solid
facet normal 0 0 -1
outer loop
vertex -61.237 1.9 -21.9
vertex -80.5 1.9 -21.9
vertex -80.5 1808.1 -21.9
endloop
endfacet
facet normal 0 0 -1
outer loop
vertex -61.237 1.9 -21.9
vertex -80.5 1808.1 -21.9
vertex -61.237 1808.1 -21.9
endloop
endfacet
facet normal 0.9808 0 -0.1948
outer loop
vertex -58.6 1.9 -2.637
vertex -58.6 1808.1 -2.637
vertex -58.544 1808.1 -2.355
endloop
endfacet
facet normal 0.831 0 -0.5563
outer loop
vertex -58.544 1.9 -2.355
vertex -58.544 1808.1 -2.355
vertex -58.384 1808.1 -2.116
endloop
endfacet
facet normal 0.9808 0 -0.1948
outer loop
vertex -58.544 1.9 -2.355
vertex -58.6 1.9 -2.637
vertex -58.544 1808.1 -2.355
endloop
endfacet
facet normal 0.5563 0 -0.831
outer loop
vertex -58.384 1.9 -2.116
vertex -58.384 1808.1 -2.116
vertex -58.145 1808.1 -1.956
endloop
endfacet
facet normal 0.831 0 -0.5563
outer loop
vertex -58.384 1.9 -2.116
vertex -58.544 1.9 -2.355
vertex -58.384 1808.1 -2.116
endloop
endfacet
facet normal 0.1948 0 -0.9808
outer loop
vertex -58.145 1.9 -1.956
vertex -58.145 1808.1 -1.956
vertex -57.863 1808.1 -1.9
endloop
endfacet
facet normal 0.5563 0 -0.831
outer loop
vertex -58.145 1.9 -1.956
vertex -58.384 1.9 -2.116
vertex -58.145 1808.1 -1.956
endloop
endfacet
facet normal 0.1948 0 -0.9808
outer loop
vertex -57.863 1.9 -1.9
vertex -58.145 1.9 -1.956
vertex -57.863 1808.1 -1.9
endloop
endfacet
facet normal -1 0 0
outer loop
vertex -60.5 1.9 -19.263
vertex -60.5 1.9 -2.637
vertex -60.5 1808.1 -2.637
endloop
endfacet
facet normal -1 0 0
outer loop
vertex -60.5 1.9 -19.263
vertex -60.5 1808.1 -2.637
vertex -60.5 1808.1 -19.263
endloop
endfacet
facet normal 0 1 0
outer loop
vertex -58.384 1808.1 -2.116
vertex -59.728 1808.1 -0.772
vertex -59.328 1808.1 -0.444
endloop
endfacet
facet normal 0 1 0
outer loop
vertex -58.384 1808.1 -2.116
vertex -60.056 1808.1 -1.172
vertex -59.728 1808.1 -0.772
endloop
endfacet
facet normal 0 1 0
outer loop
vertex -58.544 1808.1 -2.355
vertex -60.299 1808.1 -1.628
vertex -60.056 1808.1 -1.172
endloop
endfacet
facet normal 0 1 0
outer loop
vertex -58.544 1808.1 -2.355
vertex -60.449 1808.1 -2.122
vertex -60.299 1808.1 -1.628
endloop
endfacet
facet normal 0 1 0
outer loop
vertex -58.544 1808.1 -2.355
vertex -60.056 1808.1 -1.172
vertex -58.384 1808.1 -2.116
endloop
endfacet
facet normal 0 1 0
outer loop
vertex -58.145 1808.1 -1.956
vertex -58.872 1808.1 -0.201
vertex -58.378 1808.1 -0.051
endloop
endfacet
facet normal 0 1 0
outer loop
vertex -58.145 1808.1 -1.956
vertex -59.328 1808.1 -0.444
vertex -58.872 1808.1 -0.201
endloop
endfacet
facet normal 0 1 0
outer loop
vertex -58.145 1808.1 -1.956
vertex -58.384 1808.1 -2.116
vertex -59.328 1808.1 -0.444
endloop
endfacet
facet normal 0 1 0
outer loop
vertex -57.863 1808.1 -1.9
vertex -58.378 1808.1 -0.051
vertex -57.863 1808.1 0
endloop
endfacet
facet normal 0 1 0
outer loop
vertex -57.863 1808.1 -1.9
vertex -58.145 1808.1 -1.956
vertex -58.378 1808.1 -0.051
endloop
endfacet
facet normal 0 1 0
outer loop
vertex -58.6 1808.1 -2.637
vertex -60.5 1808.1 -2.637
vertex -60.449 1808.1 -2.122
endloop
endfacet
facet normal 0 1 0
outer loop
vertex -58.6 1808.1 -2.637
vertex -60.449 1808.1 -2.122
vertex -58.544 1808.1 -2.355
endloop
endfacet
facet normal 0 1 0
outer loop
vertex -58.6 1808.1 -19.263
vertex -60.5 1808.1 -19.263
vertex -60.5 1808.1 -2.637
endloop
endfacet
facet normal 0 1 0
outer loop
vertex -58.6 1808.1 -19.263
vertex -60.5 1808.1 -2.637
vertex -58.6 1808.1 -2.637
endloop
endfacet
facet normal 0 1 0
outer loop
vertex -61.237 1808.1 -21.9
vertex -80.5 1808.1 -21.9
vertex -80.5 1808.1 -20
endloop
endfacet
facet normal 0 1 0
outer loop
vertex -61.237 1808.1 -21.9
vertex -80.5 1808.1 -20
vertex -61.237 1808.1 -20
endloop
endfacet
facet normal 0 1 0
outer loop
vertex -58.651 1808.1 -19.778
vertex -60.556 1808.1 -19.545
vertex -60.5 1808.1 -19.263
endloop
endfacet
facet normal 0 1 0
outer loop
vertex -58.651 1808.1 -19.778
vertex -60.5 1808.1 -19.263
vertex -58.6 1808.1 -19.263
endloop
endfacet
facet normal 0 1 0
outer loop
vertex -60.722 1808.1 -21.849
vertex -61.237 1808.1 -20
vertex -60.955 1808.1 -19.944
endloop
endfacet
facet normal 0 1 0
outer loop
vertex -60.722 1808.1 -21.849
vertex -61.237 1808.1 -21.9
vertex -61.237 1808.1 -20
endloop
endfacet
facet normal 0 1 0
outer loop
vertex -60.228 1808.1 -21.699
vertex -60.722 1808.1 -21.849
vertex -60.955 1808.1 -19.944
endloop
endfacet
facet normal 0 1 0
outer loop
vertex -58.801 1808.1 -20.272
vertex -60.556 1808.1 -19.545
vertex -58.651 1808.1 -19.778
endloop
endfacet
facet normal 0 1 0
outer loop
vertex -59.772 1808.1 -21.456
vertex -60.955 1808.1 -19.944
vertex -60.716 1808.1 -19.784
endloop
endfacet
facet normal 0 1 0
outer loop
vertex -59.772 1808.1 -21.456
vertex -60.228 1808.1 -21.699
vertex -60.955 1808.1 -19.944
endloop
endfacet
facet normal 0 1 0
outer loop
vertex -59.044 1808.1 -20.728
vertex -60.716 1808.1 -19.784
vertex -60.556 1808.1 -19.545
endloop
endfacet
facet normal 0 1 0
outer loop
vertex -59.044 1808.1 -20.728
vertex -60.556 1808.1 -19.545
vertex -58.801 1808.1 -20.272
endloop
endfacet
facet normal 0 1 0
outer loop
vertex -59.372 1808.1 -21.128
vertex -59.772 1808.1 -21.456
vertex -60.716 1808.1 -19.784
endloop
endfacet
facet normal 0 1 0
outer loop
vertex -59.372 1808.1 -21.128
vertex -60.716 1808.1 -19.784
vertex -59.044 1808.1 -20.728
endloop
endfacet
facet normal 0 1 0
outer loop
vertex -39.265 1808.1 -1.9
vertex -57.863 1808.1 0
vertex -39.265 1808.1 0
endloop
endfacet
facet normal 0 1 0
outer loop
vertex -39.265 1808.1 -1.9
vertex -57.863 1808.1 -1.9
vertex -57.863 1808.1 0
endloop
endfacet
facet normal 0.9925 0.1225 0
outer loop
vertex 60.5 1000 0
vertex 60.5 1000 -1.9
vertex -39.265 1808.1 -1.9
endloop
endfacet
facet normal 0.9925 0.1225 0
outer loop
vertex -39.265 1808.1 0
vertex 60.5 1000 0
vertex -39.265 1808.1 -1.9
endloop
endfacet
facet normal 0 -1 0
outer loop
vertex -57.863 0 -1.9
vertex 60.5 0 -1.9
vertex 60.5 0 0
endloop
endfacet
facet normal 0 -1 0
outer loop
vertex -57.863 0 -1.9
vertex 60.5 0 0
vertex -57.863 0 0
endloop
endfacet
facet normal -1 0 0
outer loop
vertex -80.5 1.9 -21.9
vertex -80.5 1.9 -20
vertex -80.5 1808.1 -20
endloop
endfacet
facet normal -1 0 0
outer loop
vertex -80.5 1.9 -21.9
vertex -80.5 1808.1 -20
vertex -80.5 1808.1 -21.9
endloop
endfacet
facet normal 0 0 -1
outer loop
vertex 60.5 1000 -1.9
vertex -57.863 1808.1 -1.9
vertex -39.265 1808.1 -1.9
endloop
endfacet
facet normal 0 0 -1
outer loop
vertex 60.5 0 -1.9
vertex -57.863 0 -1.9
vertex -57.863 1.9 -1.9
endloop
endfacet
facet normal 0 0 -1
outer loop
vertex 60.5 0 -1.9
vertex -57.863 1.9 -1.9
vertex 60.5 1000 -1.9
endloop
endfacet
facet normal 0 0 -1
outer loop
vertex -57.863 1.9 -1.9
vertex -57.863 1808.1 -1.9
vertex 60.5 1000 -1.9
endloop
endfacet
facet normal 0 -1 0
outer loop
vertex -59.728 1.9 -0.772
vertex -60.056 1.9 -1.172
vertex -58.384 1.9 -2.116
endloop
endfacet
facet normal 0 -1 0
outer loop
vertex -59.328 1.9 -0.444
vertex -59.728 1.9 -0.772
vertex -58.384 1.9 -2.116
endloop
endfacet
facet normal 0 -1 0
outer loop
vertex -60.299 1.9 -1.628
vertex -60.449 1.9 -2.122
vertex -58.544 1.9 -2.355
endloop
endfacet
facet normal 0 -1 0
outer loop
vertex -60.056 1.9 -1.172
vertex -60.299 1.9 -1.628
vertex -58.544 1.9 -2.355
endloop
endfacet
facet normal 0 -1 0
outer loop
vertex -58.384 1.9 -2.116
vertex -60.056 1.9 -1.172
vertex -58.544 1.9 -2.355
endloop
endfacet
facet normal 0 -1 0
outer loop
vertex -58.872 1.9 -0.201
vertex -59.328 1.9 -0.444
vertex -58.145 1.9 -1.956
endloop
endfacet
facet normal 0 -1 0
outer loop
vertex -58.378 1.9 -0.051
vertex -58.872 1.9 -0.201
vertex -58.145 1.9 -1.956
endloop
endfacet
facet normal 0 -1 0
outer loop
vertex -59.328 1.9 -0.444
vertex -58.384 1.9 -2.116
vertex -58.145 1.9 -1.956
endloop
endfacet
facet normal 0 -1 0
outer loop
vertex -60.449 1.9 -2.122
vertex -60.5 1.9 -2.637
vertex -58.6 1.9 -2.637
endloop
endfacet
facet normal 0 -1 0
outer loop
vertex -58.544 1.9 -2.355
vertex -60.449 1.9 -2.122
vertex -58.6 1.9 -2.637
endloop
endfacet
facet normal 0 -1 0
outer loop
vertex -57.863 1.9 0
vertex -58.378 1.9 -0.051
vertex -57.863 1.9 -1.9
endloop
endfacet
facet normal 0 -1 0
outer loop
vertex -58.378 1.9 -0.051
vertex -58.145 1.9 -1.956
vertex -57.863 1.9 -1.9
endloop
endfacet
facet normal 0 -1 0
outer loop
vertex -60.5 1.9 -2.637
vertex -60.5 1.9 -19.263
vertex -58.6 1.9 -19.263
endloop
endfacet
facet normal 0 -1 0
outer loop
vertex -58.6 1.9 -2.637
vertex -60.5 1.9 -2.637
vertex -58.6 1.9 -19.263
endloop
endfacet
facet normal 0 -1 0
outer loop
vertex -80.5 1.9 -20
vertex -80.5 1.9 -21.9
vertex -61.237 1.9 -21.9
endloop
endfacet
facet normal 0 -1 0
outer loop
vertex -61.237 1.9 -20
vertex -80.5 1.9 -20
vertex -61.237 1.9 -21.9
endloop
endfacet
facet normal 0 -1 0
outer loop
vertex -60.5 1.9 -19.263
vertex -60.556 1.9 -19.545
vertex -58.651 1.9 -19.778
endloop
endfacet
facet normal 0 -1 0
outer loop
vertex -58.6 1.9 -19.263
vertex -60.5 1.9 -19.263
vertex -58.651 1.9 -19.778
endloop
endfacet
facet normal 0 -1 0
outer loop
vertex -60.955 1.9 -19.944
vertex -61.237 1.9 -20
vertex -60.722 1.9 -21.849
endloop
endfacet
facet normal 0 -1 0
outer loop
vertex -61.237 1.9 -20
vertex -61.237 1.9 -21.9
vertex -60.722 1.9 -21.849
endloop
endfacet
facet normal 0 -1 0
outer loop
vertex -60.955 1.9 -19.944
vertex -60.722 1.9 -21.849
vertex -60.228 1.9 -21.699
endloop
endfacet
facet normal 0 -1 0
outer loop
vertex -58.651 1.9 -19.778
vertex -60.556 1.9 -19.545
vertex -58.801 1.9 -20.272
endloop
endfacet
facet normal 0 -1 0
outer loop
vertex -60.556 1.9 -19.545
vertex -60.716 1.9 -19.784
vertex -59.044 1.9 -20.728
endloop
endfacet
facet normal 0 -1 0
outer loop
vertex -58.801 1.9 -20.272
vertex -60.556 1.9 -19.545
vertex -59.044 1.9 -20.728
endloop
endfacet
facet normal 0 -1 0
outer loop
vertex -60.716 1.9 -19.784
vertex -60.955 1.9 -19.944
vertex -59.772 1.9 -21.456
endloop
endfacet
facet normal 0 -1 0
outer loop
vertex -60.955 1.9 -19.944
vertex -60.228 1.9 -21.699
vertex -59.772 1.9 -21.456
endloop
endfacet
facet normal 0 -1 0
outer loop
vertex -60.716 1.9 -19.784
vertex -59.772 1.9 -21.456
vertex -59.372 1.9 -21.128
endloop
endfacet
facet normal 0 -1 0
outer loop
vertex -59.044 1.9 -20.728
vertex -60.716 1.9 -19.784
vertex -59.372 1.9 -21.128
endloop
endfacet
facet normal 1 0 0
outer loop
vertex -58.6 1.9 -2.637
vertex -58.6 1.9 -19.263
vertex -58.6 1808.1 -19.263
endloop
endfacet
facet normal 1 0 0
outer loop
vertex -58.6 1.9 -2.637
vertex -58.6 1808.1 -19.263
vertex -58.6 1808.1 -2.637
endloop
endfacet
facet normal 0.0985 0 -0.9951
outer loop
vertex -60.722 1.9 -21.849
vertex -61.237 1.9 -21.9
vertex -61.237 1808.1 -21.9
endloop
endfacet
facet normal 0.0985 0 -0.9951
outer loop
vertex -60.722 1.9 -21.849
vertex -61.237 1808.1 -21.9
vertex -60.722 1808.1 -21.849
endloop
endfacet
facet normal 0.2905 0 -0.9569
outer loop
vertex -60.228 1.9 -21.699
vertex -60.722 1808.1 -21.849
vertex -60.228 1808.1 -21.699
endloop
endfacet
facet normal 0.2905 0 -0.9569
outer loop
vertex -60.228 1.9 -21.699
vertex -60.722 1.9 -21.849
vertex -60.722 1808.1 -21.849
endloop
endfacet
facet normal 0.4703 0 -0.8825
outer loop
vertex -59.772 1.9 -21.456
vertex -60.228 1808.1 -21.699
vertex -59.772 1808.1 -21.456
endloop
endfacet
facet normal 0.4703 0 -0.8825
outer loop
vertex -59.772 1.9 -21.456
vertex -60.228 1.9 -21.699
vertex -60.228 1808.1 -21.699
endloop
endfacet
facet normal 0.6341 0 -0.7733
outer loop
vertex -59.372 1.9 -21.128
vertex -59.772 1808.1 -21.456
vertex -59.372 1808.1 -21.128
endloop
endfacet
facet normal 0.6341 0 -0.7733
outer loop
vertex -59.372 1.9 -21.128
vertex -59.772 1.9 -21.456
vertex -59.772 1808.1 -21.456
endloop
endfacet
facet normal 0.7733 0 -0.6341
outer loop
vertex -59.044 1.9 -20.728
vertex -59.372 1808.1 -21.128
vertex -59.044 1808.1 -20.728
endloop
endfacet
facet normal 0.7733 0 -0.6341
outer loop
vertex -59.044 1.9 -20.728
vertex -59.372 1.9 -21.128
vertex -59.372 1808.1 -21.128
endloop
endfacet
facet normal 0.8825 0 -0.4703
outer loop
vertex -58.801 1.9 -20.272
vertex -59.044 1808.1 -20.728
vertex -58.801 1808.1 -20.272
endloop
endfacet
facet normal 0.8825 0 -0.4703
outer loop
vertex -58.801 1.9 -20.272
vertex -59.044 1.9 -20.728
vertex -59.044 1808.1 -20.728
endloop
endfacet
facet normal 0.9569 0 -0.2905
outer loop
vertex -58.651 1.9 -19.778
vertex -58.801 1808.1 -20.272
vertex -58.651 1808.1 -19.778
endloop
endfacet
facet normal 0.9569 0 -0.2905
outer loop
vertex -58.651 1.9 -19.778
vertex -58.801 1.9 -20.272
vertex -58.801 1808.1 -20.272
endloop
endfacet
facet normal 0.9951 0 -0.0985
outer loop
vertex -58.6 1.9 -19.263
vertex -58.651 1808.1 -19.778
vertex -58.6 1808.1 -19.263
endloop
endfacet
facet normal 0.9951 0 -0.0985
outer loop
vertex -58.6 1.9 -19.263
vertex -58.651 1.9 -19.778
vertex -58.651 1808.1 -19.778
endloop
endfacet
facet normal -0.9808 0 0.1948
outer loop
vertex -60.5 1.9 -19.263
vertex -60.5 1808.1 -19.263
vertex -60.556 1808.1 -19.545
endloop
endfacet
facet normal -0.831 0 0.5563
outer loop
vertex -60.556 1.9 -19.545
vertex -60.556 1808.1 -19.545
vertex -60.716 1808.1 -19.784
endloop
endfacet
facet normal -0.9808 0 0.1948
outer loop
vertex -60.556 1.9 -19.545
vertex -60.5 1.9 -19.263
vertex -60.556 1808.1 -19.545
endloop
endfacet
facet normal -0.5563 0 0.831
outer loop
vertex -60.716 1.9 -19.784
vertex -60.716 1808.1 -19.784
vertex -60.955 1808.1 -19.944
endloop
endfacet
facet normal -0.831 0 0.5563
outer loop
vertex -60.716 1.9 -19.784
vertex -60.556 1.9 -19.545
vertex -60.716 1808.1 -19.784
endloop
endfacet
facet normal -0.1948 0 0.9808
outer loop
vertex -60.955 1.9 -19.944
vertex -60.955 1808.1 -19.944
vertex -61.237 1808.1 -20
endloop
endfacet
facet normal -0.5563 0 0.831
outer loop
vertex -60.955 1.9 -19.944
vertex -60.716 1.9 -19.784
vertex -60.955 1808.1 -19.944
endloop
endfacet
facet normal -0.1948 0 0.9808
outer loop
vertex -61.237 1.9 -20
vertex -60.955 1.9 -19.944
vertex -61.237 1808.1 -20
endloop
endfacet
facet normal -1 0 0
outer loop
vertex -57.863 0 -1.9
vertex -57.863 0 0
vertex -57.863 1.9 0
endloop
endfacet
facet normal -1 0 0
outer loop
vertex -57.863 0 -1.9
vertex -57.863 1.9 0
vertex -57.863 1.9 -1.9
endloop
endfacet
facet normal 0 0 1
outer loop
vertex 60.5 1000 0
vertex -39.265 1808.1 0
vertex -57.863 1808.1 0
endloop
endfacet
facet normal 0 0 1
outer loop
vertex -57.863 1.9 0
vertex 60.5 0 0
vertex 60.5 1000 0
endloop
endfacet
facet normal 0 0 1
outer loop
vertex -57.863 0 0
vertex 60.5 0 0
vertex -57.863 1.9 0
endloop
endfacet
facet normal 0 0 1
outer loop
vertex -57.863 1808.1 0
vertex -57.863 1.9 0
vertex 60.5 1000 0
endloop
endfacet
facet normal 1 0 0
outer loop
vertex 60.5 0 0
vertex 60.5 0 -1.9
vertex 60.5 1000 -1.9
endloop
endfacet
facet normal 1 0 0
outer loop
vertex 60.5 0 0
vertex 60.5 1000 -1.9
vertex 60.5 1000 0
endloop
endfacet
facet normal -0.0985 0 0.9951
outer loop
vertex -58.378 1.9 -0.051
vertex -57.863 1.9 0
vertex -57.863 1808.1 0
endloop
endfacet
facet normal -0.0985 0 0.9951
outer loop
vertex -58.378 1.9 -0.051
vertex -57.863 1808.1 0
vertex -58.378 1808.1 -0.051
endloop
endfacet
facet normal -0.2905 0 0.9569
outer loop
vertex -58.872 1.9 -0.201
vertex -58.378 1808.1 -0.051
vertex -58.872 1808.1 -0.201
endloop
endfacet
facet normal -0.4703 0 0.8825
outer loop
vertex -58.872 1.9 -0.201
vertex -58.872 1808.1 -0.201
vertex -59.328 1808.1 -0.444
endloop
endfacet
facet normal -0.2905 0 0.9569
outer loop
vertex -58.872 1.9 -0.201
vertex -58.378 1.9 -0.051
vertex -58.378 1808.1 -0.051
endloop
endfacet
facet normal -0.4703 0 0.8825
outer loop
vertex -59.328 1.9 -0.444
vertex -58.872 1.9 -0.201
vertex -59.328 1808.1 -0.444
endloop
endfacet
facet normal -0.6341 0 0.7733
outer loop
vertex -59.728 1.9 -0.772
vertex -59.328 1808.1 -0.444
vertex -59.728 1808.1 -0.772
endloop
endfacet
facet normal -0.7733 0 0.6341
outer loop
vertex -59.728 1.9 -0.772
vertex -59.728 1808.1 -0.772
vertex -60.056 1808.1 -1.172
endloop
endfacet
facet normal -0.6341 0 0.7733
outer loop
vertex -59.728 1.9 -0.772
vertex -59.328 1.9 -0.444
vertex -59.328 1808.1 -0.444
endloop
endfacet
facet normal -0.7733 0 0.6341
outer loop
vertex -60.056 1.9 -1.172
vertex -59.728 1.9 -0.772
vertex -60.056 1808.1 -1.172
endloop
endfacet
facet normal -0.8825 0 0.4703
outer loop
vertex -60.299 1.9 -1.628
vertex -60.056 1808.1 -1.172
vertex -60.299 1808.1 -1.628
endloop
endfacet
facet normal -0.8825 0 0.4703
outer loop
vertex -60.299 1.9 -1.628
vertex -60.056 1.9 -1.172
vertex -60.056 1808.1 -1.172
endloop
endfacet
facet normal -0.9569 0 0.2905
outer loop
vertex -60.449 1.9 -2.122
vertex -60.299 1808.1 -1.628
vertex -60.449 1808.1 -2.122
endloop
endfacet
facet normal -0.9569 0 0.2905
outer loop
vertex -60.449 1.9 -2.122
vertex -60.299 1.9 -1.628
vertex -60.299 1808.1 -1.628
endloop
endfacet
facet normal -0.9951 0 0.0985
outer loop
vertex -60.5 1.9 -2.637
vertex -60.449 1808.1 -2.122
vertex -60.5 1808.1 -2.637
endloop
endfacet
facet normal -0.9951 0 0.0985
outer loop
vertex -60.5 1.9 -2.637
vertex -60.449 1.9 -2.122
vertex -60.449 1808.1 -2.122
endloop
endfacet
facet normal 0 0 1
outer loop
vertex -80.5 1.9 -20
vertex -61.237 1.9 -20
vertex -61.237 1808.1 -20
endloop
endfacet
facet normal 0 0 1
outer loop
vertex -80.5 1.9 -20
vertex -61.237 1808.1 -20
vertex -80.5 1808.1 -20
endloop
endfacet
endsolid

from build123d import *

# Parameters (mm, degrees)
BRIDA_BASE4_DEPTH          = 1810
CORTAR_EXTRUIR1_DEPTH      = 1812.921593226
CORTAR_EXTRUIR1_DEPTH_BACK = 1812.921593226
CORTAR_EXTRUIR2_DEPTH      = 1.9
CORTAR_EXTRUIR3_DEPTH      = 1812.899624703
CORTAR_EXTRUIR3_DEPTH_BACK = 1812.899624703
CROQUIS22_W                = 55.247943396
CROQUIS22_H                = 1.9


# Read off the part's stored shape, not the designer's step: Cortar-Extruir2
# Sheet-metal steps are written as plain solids
with BuildPart() as part:
    # Croquis1 → Brida base4 (new body)
    with BuildSketch(Plane(origin=(0, 0, 0), x_dir=(1, 0, 0), z_dir=(0, 1, 0))):
        with BuildLine():
            Line((60.5, 0), (-57.8634, 0))
            ThreePointArc((-57.8634, 0), (-59.727757739, 0.772242261), (-60.5, 2.6366))
            Line((-60.5, 2.6366), (-60.5, 19.2634))
            ThreePointArc((-60.5, 19.2634), (-60.715745145, 19.784254855), (-61.2366, 20))
            Line((-61.2366, 20), (-80.5, 20))
            Line((-80.5, 20), (-80.5, 21.9))
            Line((-80.5, 21.9), (-61.2366, 21.9))
            ThreePointArc((-61.2366, 21.9), (-59.372242261, 21.127757739), (-58.6, 19.2634))
            Line((-58.6, 19.2634), (-58.6, 2.6366))
            ThreePointArc((-58.6, 2.6366), (-58.384254855, 2.115745145), (-57.8634, 1.9))
            Line((-57.8634, 1.9), (60.5, 1.9))
            Line((60.5, 1.9), (60.5, 0))
        make_face()
    extrude(amount=BRIDA_BASE4_DEPTH)

    # Croquis19 → Cortar-Extruir1 (cut, two sides: drawn at the far end of the back side and taken through both)
    with BuildSketch(Plane.XY.offset(-CORTAR_EXTRUIR1_DEPTH_BACK)):
        Polygon((60.5, 1000), (-39.5, 1810), (-39.5, 1900.089959651), (60.5, 1900.089959651), align=None)
    extrude(amount=CORTAR_EXTRUIR1_DEPTH + CORTAR_EXTRUIR1_DEPTH_BACK, mode=Mode.SUBTRACT)

    # Cortar-Extruir2 outline → Cortar-Extruir2 (cut)
    with BuildSketch(Plane(origin=(0, 0, 0), x_dir=(1, 0, 0), z_dir=(0, 1, 0))):
        with BuildLine():
            Line((-57.8634, 0), (-57.8634, 1.9))
            ThreePointArc((-57.8634, 1.9), (-58.384254855, 2.115745145), (-58.6, 2.6366))
            Line((-58.6, 2.6366), (-58.6, 19.2634))
            ThreePointArc((-58.6, 19.2634), (-59.372242261, 21.127757739), (-61.2366, 21.9))
            Line((-61.2366, 21.9), (-80.5, 21.9))
            Line((-80.5, 21.9), (-80.5, 20))
            Line((-80.5, 20), (-61.2366, 20))
            ThreePointArc((-61.2366, 20), (-60.715745145, 19.784254855), (-60.5, 19.2634))
            Line((-60.5, 19.2634), (-60.5, 2.6366))
            ThreePointArc((-60.5, 2.6366), (-59.727757739, 0.772242261), (-57.8634, 0))
        make_face()
    extrude(amount=CORTAR_EXTRUIR2_DEPTH, mode=Mode.SUBTRACT)

    # Croquis22 → Cortar-Extruir3 (cut, two sides: drawn at the far end of the back side and taken through both)
    with BuildSketch(Plane.XY.offset(-20).offset(-CORTAR_EXTRUIR3_DEPTH_BACK)):
        with Locations((-52.876028302, 1809.05)):
            Rectangle(CROQUIS22_W, CROQUIS22_H)
    extrude(amount=CORTAR_EXTRUIR3_DEPTH + CORTAR_EXTRUIR3_DEPTH_BACK, mode=Mode.SUBTRACT)


solid = part.part
